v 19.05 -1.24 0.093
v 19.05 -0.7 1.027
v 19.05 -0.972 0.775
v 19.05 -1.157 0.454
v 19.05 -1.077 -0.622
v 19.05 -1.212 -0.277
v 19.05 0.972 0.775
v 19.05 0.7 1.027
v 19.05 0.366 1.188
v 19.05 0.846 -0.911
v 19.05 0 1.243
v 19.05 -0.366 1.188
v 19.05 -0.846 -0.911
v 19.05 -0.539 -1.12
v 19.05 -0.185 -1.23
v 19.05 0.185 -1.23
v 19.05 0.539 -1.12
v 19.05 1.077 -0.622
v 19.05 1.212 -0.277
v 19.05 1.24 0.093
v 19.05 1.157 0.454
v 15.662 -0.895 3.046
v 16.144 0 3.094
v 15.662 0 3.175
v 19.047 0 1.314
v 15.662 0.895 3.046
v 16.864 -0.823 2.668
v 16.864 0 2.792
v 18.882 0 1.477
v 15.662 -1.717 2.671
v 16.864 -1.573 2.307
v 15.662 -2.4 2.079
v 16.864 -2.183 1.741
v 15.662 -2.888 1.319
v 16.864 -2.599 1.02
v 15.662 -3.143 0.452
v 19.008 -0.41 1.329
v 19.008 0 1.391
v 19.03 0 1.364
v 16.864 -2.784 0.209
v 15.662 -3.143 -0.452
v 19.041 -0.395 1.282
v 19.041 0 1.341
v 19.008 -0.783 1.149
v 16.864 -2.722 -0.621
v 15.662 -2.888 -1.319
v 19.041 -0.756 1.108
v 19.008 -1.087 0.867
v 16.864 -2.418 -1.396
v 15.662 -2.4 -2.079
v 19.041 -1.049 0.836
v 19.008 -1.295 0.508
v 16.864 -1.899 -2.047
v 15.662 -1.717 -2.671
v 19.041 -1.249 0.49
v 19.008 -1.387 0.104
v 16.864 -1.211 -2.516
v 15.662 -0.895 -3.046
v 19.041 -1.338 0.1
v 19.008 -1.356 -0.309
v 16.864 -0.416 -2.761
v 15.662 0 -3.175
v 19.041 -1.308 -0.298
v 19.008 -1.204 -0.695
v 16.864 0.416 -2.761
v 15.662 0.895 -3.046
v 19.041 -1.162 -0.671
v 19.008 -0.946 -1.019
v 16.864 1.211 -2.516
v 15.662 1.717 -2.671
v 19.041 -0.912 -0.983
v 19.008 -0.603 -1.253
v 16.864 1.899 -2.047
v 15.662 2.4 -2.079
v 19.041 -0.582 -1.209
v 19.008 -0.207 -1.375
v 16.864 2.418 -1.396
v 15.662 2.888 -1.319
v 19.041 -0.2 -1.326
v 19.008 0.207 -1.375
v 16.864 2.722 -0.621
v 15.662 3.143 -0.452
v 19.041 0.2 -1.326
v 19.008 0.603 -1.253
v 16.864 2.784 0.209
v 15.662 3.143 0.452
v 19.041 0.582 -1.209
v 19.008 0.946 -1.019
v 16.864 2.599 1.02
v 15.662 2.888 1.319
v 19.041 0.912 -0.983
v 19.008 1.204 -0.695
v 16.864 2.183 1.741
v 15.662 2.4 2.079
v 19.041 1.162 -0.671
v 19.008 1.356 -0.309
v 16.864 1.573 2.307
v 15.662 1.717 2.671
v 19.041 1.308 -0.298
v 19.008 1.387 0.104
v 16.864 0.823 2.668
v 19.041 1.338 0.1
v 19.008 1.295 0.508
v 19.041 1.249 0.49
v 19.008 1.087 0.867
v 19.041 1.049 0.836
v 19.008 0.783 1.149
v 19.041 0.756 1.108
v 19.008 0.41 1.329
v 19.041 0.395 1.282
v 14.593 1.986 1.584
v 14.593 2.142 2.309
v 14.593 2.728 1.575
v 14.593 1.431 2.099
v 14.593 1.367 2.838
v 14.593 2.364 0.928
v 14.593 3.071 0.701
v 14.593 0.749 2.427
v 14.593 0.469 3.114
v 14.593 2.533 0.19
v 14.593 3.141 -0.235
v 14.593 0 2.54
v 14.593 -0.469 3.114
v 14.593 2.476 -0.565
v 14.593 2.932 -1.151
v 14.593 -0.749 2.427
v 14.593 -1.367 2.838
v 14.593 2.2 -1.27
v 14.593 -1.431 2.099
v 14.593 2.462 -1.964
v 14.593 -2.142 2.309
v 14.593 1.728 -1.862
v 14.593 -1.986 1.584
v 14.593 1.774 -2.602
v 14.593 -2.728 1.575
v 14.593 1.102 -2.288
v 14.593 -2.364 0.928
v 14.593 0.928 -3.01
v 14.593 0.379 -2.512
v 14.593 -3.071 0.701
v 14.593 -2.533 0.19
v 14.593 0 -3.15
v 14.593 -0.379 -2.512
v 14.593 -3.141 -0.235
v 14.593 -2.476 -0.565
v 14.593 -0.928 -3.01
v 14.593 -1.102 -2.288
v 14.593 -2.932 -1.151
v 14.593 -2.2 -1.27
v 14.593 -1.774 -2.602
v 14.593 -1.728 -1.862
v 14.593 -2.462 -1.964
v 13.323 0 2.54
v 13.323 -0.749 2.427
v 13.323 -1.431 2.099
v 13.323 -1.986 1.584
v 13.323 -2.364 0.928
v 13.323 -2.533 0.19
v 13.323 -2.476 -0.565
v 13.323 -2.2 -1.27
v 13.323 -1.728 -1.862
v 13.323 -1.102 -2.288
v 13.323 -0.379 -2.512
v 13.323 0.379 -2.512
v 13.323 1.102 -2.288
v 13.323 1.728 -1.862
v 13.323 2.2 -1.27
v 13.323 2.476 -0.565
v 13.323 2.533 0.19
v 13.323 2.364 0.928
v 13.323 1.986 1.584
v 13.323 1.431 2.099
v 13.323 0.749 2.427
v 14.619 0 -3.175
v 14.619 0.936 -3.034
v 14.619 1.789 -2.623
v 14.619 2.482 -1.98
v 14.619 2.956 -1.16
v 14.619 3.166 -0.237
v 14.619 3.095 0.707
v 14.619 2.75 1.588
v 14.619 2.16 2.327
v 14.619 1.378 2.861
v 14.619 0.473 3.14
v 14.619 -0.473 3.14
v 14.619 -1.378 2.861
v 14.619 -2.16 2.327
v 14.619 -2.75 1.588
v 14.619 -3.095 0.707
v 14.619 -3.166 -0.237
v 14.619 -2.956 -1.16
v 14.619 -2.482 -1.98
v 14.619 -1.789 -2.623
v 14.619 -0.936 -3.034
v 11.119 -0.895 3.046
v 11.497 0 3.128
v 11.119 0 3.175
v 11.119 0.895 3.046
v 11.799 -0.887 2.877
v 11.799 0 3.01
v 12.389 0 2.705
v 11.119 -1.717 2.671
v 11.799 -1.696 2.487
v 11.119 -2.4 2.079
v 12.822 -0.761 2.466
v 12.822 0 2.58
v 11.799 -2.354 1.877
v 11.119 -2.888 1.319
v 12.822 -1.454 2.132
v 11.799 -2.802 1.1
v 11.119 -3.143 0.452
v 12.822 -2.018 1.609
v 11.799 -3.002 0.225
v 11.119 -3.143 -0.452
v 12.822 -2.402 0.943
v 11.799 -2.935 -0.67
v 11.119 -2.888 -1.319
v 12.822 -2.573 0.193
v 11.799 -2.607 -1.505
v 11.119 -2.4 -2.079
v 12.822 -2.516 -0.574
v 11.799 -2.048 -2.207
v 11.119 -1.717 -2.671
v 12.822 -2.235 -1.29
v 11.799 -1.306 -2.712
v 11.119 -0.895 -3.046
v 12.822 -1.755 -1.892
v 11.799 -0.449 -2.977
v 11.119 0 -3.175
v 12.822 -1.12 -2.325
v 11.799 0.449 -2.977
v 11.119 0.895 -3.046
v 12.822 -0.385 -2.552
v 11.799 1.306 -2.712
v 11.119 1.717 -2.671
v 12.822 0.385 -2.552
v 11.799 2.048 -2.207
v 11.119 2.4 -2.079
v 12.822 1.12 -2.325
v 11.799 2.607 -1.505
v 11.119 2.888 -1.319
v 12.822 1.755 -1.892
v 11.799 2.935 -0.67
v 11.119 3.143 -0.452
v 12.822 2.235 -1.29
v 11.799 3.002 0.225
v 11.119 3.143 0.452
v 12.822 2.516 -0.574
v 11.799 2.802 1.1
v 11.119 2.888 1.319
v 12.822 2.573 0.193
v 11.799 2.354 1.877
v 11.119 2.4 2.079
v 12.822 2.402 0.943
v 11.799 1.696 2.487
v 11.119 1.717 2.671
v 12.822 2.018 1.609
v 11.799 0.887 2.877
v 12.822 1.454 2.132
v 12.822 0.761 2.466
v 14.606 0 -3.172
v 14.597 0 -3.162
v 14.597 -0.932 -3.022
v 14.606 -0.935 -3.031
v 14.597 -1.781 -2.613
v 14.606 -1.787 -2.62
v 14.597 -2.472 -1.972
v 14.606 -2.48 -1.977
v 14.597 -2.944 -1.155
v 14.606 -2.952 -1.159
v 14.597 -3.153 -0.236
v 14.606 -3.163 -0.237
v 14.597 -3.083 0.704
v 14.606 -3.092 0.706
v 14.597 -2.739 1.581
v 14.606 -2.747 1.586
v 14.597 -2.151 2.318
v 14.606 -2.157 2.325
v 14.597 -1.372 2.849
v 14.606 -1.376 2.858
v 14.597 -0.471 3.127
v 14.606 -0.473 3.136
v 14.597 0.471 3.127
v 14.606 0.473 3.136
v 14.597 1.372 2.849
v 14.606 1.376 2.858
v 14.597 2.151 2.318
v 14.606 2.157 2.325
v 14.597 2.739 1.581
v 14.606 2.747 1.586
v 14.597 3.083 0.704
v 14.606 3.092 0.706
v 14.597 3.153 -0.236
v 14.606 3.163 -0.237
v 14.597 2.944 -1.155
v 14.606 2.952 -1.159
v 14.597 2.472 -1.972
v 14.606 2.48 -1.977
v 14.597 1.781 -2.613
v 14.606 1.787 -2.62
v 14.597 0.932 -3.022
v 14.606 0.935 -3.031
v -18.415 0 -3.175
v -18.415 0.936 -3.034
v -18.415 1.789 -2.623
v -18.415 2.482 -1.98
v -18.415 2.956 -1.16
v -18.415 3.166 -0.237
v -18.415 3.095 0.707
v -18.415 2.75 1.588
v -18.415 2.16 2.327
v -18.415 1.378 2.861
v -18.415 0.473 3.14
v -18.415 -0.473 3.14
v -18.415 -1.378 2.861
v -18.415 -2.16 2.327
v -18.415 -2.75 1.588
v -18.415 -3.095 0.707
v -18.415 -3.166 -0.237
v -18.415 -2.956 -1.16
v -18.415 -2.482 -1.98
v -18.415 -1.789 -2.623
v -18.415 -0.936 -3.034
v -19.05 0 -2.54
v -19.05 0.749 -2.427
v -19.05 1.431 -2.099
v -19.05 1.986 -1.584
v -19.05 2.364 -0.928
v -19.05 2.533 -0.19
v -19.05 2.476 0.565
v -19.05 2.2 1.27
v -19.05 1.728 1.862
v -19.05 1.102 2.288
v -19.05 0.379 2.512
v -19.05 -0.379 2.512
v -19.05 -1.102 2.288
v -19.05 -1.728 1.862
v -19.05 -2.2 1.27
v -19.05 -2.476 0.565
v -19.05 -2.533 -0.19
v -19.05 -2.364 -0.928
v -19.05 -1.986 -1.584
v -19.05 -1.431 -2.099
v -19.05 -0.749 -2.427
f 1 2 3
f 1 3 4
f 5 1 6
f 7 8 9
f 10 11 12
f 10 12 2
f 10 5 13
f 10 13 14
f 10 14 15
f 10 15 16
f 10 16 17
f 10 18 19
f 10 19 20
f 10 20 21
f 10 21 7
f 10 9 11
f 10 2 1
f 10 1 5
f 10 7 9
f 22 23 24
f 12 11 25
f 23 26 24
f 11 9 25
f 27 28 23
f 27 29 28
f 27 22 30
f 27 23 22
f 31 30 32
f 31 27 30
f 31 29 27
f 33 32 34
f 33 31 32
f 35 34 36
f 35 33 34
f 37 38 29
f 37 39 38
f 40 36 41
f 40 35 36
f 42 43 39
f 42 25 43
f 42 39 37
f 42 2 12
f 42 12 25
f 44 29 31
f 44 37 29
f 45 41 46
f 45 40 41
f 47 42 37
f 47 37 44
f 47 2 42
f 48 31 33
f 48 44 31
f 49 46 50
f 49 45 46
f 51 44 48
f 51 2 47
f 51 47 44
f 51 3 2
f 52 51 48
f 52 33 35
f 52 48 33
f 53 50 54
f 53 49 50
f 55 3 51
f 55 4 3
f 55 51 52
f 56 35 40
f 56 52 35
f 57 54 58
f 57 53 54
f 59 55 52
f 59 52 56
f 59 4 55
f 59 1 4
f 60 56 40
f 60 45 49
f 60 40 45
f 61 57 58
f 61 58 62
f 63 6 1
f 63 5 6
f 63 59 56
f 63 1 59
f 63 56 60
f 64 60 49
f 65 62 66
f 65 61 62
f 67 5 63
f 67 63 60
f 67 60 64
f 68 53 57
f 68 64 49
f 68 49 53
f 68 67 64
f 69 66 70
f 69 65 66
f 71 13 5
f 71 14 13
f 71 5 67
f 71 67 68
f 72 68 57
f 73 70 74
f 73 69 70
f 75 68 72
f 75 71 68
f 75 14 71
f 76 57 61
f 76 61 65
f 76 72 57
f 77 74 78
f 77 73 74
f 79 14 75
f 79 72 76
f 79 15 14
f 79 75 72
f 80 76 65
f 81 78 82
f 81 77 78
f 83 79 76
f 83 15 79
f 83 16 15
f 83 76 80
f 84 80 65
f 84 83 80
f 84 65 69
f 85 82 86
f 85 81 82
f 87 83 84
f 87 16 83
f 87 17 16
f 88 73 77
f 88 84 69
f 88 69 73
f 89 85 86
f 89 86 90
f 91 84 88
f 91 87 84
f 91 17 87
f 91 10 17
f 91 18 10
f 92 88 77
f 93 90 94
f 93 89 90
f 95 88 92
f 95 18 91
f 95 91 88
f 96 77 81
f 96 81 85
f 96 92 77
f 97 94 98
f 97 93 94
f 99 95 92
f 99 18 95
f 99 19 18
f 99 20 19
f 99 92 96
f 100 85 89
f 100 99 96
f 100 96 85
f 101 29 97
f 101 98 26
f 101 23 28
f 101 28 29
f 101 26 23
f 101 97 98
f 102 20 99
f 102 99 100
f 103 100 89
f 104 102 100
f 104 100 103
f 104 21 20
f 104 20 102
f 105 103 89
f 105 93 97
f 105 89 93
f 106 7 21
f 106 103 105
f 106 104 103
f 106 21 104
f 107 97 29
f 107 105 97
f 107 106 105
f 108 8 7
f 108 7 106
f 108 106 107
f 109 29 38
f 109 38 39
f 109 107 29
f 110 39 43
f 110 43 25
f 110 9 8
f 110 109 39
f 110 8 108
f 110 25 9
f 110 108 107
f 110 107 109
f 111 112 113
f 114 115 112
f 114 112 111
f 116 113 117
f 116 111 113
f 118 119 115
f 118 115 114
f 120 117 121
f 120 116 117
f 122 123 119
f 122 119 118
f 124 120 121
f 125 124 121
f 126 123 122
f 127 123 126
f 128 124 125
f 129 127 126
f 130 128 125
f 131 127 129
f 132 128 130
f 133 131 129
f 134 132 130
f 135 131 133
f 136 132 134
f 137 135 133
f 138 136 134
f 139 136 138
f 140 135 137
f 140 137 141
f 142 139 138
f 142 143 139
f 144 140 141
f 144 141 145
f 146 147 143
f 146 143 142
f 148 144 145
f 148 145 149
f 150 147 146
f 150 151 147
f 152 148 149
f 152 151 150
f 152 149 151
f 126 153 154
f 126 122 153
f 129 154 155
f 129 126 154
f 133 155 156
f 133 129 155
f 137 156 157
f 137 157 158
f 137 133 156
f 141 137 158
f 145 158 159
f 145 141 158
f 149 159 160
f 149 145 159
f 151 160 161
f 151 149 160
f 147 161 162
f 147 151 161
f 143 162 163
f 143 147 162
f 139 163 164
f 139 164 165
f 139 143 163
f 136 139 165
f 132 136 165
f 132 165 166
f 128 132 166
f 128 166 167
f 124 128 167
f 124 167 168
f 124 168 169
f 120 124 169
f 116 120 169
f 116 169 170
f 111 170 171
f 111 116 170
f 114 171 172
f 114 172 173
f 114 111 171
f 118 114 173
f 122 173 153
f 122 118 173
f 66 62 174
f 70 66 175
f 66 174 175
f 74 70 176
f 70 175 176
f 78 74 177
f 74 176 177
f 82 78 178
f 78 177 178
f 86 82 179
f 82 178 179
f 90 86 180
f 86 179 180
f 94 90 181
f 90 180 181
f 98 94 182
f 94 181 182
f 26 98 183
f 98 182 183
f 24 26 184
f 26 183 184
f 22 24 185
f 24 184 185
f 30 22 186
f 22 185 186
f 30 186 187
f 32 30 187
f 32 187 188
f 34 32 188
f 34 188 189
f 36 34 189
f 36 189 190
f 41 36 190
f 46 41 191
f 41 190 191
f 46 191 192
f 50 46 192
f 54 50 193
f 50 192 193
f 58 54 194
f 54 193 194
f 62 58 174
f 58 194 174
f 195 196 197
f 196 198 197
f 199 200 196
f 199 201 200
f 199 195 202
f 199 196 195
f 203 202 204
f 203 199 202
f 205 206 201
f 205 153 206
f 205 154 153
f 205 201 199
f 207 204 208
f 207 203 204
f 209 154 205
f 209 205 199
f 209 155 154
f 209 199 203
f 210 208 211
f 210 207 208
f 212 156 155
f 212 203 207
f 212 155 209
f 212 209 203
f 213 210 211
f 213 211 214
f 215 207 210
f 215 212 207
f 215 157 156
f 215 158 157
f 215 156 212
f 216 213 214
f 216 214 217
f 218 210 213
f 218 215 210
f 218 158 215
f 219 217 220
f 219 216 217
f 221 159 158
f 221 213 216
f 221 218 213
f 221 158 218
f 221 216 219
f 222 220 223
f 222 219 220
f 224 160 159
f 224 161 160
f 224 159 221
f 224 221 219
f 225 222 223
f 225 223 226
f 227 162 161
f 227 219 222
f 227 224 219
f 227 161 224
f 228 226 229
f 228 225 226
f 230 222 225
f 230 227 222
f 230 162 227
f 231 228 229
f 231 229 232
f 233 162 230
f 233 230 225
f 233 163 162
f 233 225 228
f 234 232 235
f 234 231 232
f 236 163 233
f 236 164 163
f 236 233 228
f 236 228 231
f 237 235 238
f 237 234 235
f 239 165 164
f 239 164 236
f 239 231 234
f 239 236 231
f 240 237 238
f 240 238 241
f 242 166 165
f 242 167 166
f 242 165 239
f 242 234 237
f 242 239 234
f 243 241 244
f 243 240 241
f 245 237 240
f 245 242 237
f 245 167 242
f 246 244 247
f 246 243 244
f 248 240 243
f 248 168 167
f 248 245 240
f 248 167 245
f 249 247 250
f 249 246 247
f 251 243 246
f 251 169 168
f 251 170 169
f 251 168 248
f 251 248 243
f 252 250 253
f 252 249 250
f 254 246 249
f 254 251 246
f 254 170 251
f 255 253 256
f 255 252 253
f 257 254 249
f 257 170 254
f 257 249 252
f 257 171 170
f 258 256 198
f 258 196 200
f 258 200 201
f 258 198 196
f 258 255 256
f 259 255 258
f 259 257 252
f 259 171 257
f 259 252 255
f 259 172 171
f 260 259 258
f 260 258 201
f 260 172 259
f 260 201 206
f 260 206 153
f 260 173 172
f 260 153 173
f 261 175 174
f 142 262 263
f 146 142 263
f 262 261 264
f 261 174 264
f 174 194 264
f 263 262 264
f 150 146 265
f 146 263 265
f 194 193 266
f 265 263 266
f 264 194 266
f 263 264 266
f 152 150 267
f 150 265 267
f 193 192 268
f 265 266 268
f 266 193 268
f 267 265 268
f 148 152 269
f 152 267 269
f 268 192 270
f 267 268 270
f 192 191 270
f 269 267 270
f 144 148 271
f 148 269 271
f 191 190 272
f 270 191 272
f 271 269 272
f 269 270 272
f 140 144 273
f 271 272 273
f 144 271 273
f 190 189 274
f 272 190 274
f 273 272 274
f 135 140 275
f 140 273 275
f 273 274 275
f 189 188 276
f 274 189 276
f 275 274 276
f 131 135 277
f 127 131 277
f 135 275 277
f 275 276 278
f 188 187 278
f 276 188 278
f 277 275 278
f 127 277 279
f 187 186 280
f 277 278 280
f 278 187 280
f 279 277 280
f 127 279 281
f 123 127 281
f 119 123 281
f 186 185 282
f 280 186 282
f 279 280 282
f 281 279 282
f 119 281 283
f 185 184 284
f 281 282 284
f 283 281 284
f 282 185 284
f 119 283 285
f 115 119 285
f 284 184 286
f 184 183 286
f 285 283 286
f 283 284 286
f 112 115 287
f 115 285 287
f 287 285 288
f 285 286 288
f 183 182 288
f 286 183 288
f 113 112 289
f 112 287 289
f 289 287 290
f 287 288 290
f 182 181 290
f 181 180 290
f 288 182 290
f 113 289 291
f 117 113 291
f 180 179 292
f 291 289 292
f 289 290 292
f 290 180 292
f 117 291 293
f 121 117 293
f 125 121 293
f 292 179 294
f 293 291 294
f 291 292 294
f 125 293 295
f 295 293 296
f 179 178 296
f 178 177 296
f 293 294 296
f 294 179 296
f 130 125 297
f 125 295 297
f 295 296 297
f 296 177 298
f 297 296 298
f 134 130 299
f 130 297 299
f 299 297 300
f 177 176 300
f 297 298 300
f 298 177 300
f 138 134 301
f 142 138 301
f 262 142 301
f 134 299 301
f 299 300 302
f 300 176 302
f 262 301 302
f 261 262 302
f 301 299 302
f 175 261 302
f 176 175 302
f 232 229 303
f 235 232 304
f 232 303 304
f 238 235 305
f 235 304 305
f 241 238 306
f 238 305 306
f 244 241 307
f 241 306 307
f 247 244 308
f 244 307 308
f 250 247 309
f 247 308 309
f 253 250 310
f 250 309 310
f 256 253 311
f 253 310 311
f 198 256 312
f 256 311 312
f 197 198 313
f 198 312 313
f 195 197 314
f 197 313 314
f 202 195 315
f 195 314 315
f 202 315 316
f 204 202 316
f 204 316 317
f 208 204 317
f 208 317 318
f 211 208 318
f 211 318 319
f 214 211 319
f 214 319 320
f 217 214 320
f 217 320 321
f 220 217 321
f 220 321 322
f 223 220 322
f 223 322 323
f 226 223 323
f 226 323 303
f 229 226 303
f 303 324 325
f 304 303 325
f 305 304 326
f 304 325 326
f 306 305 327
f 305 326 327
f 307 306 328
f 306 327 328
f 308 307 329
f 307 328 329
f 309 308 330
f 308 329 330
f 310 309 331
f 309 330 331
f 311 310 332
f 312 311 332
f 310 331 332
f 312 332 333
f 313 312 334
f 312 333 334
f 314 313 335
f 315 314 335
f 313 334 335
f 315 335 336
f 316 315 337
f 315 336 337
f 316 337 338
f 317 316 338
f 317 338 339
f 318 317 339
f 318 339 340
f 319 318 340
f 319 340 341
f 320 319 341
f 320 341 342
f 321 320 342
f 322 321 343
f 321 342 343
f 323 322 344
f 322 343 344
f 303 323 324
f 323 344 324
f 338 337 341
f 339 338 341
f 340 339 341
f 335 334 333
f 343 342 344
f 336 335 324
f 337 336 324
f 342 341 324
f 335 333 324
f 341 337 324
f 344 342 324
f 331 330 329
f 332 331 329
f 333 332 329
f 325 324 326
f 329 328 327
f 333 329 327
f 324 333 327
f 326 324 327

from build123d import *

# Parameters (mm, degrees)
EXTRUDE1_DEPTH      = 19.05
EXTRUDE1_DEPTH_BACK = 19.05
SKETCH2_R           = 3.175
CHAMFER1_SIZE       = 0.635
FILLET1_R           = 0.0254


with BuildPart() as part:
    # Sketch2 → Extrude1 (new, two sides: drawn at the far end of the back side and taken through both)
    with BuildSketch(Plane(origin=(0, 0, 0), x_dir=(0, 0, -1), z_dir=(1, 0, 0)).offset(-EXTRUDE1_DEPTH_BACK)):
        Circle(SKETCH2_R)
    extrude(amount=EXTRUDE1_DEPTH + EXTRUDE1_DEPTH_BACK)

    # Chamfer1
    chamfer1_edges = [part.edges().sort_by_distance(p)[0] for p in [
        (-19.05, 0, 3.175),
        (19.05, 0, 3.175),
    ]]
    chamfer(chamfer1_edges, length=CHAMFER1_SIZE)

    # Sketch3 → Cut-Revolve1 (revolve, cut)
    with BuildSketch(Plane.XY, mode=Mode.PRIVATE) as cut_revolve1_sk:
        with BuildLine():
            Line((14.593409285, 2.54), (14.593409285, 3.175))
            Line((14.593409285, 3.175), (11.118656598, 3.175))
            add(Edge.make_bspline(
                [(11.118656598, 3.175), (11.987913735, 3.175), (12.0733688, 2.54), (13.323409285, 2.54)],
                knots=[0, 0, 0, 0, 1, 1, 1, 1], degree=3))
            Line((13.323409285, 2.54), (14.593409285, 2.54))
        make_face()
        with BuildLine():
            Line((19.05, 3.175), (15.662226672, 3.175))
            add(Edge.make_bspline(
                [(15.662226672, 3.175), (16.642763194, 3.175), (18.613991134, 1.631073428), (19.044096366, 1.382495278), (19.05, 1.348727309), (19.05, 1.243390408)],
                knots=[0, 0, 0, 0, 0.565725481, 0.665725481, 1, 1, 1, 1], degree=3))
            Line((19.05, 1.243390408), (19.05, 3.175))
        make_face()
    revolve(cut_revolve1_sk.sketch.rotate(Axis((-19.05, 0, 0), (1, 0, 0)), 90), axis=Axis((-19.05, 0, 0), (1, 0, 0)), mode=Mode.SUBTRACT)

    # Fillet1
    fillet1_edges = [part.edges().sort_by_distance(p)[0] for p in [
        (14.593409285, 0, 3.175),
    ]]
    fillet(fillet1_edges, radius=FILLET1_R)


solid = part.part
